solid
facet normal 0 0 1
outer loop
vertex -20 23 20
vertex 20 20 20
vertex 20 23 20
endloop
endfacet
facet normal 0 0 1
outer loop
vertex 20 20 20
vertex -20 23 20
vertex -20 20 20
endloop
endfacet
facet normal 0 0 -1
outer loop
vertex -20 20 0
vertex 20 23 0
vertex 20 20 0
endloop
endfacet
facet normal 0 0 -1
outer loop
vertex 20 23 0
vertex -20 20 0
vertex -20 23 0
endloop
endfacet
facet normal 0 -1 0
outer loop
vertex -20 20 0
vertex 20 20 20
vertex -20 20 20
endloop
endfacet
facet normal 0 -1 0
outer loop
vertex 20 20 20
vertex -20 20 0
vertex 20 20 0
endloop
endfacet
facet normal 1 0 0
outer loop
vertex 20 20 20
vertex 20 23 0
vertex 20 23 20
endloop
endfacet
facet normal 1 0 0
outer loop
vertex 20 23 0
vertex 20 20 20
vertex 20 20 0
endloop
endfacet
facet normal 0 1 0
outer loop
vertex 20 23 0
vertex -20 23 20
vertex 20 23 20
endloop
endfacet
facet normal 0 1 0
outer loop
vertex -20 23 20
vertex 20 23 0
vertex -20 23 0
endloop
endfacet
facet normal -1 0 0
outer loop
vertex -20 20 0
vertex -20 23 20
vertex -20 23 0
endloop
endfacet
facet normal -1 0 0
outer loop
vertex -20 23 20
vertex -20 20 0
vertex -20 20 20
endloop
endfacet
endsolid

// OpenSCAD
// 3 mm cover panel on the +Y face, mounted after the screw: HEAD_HOLE=false reproduces INC-2026-11-08-01
HEAD_HOLE = is_undef(HEAD_HOLE) ? false : HEAD_HOLE;
difference() {
    translate([-20, 20, 0]) cube([40, 3, 20]);
    if (HEAD_HOLE) translate([0, 24, 5]) rotate([90, 0, 0]) cylinder(d = 8.5, h = 5, $fn = 32);
}
